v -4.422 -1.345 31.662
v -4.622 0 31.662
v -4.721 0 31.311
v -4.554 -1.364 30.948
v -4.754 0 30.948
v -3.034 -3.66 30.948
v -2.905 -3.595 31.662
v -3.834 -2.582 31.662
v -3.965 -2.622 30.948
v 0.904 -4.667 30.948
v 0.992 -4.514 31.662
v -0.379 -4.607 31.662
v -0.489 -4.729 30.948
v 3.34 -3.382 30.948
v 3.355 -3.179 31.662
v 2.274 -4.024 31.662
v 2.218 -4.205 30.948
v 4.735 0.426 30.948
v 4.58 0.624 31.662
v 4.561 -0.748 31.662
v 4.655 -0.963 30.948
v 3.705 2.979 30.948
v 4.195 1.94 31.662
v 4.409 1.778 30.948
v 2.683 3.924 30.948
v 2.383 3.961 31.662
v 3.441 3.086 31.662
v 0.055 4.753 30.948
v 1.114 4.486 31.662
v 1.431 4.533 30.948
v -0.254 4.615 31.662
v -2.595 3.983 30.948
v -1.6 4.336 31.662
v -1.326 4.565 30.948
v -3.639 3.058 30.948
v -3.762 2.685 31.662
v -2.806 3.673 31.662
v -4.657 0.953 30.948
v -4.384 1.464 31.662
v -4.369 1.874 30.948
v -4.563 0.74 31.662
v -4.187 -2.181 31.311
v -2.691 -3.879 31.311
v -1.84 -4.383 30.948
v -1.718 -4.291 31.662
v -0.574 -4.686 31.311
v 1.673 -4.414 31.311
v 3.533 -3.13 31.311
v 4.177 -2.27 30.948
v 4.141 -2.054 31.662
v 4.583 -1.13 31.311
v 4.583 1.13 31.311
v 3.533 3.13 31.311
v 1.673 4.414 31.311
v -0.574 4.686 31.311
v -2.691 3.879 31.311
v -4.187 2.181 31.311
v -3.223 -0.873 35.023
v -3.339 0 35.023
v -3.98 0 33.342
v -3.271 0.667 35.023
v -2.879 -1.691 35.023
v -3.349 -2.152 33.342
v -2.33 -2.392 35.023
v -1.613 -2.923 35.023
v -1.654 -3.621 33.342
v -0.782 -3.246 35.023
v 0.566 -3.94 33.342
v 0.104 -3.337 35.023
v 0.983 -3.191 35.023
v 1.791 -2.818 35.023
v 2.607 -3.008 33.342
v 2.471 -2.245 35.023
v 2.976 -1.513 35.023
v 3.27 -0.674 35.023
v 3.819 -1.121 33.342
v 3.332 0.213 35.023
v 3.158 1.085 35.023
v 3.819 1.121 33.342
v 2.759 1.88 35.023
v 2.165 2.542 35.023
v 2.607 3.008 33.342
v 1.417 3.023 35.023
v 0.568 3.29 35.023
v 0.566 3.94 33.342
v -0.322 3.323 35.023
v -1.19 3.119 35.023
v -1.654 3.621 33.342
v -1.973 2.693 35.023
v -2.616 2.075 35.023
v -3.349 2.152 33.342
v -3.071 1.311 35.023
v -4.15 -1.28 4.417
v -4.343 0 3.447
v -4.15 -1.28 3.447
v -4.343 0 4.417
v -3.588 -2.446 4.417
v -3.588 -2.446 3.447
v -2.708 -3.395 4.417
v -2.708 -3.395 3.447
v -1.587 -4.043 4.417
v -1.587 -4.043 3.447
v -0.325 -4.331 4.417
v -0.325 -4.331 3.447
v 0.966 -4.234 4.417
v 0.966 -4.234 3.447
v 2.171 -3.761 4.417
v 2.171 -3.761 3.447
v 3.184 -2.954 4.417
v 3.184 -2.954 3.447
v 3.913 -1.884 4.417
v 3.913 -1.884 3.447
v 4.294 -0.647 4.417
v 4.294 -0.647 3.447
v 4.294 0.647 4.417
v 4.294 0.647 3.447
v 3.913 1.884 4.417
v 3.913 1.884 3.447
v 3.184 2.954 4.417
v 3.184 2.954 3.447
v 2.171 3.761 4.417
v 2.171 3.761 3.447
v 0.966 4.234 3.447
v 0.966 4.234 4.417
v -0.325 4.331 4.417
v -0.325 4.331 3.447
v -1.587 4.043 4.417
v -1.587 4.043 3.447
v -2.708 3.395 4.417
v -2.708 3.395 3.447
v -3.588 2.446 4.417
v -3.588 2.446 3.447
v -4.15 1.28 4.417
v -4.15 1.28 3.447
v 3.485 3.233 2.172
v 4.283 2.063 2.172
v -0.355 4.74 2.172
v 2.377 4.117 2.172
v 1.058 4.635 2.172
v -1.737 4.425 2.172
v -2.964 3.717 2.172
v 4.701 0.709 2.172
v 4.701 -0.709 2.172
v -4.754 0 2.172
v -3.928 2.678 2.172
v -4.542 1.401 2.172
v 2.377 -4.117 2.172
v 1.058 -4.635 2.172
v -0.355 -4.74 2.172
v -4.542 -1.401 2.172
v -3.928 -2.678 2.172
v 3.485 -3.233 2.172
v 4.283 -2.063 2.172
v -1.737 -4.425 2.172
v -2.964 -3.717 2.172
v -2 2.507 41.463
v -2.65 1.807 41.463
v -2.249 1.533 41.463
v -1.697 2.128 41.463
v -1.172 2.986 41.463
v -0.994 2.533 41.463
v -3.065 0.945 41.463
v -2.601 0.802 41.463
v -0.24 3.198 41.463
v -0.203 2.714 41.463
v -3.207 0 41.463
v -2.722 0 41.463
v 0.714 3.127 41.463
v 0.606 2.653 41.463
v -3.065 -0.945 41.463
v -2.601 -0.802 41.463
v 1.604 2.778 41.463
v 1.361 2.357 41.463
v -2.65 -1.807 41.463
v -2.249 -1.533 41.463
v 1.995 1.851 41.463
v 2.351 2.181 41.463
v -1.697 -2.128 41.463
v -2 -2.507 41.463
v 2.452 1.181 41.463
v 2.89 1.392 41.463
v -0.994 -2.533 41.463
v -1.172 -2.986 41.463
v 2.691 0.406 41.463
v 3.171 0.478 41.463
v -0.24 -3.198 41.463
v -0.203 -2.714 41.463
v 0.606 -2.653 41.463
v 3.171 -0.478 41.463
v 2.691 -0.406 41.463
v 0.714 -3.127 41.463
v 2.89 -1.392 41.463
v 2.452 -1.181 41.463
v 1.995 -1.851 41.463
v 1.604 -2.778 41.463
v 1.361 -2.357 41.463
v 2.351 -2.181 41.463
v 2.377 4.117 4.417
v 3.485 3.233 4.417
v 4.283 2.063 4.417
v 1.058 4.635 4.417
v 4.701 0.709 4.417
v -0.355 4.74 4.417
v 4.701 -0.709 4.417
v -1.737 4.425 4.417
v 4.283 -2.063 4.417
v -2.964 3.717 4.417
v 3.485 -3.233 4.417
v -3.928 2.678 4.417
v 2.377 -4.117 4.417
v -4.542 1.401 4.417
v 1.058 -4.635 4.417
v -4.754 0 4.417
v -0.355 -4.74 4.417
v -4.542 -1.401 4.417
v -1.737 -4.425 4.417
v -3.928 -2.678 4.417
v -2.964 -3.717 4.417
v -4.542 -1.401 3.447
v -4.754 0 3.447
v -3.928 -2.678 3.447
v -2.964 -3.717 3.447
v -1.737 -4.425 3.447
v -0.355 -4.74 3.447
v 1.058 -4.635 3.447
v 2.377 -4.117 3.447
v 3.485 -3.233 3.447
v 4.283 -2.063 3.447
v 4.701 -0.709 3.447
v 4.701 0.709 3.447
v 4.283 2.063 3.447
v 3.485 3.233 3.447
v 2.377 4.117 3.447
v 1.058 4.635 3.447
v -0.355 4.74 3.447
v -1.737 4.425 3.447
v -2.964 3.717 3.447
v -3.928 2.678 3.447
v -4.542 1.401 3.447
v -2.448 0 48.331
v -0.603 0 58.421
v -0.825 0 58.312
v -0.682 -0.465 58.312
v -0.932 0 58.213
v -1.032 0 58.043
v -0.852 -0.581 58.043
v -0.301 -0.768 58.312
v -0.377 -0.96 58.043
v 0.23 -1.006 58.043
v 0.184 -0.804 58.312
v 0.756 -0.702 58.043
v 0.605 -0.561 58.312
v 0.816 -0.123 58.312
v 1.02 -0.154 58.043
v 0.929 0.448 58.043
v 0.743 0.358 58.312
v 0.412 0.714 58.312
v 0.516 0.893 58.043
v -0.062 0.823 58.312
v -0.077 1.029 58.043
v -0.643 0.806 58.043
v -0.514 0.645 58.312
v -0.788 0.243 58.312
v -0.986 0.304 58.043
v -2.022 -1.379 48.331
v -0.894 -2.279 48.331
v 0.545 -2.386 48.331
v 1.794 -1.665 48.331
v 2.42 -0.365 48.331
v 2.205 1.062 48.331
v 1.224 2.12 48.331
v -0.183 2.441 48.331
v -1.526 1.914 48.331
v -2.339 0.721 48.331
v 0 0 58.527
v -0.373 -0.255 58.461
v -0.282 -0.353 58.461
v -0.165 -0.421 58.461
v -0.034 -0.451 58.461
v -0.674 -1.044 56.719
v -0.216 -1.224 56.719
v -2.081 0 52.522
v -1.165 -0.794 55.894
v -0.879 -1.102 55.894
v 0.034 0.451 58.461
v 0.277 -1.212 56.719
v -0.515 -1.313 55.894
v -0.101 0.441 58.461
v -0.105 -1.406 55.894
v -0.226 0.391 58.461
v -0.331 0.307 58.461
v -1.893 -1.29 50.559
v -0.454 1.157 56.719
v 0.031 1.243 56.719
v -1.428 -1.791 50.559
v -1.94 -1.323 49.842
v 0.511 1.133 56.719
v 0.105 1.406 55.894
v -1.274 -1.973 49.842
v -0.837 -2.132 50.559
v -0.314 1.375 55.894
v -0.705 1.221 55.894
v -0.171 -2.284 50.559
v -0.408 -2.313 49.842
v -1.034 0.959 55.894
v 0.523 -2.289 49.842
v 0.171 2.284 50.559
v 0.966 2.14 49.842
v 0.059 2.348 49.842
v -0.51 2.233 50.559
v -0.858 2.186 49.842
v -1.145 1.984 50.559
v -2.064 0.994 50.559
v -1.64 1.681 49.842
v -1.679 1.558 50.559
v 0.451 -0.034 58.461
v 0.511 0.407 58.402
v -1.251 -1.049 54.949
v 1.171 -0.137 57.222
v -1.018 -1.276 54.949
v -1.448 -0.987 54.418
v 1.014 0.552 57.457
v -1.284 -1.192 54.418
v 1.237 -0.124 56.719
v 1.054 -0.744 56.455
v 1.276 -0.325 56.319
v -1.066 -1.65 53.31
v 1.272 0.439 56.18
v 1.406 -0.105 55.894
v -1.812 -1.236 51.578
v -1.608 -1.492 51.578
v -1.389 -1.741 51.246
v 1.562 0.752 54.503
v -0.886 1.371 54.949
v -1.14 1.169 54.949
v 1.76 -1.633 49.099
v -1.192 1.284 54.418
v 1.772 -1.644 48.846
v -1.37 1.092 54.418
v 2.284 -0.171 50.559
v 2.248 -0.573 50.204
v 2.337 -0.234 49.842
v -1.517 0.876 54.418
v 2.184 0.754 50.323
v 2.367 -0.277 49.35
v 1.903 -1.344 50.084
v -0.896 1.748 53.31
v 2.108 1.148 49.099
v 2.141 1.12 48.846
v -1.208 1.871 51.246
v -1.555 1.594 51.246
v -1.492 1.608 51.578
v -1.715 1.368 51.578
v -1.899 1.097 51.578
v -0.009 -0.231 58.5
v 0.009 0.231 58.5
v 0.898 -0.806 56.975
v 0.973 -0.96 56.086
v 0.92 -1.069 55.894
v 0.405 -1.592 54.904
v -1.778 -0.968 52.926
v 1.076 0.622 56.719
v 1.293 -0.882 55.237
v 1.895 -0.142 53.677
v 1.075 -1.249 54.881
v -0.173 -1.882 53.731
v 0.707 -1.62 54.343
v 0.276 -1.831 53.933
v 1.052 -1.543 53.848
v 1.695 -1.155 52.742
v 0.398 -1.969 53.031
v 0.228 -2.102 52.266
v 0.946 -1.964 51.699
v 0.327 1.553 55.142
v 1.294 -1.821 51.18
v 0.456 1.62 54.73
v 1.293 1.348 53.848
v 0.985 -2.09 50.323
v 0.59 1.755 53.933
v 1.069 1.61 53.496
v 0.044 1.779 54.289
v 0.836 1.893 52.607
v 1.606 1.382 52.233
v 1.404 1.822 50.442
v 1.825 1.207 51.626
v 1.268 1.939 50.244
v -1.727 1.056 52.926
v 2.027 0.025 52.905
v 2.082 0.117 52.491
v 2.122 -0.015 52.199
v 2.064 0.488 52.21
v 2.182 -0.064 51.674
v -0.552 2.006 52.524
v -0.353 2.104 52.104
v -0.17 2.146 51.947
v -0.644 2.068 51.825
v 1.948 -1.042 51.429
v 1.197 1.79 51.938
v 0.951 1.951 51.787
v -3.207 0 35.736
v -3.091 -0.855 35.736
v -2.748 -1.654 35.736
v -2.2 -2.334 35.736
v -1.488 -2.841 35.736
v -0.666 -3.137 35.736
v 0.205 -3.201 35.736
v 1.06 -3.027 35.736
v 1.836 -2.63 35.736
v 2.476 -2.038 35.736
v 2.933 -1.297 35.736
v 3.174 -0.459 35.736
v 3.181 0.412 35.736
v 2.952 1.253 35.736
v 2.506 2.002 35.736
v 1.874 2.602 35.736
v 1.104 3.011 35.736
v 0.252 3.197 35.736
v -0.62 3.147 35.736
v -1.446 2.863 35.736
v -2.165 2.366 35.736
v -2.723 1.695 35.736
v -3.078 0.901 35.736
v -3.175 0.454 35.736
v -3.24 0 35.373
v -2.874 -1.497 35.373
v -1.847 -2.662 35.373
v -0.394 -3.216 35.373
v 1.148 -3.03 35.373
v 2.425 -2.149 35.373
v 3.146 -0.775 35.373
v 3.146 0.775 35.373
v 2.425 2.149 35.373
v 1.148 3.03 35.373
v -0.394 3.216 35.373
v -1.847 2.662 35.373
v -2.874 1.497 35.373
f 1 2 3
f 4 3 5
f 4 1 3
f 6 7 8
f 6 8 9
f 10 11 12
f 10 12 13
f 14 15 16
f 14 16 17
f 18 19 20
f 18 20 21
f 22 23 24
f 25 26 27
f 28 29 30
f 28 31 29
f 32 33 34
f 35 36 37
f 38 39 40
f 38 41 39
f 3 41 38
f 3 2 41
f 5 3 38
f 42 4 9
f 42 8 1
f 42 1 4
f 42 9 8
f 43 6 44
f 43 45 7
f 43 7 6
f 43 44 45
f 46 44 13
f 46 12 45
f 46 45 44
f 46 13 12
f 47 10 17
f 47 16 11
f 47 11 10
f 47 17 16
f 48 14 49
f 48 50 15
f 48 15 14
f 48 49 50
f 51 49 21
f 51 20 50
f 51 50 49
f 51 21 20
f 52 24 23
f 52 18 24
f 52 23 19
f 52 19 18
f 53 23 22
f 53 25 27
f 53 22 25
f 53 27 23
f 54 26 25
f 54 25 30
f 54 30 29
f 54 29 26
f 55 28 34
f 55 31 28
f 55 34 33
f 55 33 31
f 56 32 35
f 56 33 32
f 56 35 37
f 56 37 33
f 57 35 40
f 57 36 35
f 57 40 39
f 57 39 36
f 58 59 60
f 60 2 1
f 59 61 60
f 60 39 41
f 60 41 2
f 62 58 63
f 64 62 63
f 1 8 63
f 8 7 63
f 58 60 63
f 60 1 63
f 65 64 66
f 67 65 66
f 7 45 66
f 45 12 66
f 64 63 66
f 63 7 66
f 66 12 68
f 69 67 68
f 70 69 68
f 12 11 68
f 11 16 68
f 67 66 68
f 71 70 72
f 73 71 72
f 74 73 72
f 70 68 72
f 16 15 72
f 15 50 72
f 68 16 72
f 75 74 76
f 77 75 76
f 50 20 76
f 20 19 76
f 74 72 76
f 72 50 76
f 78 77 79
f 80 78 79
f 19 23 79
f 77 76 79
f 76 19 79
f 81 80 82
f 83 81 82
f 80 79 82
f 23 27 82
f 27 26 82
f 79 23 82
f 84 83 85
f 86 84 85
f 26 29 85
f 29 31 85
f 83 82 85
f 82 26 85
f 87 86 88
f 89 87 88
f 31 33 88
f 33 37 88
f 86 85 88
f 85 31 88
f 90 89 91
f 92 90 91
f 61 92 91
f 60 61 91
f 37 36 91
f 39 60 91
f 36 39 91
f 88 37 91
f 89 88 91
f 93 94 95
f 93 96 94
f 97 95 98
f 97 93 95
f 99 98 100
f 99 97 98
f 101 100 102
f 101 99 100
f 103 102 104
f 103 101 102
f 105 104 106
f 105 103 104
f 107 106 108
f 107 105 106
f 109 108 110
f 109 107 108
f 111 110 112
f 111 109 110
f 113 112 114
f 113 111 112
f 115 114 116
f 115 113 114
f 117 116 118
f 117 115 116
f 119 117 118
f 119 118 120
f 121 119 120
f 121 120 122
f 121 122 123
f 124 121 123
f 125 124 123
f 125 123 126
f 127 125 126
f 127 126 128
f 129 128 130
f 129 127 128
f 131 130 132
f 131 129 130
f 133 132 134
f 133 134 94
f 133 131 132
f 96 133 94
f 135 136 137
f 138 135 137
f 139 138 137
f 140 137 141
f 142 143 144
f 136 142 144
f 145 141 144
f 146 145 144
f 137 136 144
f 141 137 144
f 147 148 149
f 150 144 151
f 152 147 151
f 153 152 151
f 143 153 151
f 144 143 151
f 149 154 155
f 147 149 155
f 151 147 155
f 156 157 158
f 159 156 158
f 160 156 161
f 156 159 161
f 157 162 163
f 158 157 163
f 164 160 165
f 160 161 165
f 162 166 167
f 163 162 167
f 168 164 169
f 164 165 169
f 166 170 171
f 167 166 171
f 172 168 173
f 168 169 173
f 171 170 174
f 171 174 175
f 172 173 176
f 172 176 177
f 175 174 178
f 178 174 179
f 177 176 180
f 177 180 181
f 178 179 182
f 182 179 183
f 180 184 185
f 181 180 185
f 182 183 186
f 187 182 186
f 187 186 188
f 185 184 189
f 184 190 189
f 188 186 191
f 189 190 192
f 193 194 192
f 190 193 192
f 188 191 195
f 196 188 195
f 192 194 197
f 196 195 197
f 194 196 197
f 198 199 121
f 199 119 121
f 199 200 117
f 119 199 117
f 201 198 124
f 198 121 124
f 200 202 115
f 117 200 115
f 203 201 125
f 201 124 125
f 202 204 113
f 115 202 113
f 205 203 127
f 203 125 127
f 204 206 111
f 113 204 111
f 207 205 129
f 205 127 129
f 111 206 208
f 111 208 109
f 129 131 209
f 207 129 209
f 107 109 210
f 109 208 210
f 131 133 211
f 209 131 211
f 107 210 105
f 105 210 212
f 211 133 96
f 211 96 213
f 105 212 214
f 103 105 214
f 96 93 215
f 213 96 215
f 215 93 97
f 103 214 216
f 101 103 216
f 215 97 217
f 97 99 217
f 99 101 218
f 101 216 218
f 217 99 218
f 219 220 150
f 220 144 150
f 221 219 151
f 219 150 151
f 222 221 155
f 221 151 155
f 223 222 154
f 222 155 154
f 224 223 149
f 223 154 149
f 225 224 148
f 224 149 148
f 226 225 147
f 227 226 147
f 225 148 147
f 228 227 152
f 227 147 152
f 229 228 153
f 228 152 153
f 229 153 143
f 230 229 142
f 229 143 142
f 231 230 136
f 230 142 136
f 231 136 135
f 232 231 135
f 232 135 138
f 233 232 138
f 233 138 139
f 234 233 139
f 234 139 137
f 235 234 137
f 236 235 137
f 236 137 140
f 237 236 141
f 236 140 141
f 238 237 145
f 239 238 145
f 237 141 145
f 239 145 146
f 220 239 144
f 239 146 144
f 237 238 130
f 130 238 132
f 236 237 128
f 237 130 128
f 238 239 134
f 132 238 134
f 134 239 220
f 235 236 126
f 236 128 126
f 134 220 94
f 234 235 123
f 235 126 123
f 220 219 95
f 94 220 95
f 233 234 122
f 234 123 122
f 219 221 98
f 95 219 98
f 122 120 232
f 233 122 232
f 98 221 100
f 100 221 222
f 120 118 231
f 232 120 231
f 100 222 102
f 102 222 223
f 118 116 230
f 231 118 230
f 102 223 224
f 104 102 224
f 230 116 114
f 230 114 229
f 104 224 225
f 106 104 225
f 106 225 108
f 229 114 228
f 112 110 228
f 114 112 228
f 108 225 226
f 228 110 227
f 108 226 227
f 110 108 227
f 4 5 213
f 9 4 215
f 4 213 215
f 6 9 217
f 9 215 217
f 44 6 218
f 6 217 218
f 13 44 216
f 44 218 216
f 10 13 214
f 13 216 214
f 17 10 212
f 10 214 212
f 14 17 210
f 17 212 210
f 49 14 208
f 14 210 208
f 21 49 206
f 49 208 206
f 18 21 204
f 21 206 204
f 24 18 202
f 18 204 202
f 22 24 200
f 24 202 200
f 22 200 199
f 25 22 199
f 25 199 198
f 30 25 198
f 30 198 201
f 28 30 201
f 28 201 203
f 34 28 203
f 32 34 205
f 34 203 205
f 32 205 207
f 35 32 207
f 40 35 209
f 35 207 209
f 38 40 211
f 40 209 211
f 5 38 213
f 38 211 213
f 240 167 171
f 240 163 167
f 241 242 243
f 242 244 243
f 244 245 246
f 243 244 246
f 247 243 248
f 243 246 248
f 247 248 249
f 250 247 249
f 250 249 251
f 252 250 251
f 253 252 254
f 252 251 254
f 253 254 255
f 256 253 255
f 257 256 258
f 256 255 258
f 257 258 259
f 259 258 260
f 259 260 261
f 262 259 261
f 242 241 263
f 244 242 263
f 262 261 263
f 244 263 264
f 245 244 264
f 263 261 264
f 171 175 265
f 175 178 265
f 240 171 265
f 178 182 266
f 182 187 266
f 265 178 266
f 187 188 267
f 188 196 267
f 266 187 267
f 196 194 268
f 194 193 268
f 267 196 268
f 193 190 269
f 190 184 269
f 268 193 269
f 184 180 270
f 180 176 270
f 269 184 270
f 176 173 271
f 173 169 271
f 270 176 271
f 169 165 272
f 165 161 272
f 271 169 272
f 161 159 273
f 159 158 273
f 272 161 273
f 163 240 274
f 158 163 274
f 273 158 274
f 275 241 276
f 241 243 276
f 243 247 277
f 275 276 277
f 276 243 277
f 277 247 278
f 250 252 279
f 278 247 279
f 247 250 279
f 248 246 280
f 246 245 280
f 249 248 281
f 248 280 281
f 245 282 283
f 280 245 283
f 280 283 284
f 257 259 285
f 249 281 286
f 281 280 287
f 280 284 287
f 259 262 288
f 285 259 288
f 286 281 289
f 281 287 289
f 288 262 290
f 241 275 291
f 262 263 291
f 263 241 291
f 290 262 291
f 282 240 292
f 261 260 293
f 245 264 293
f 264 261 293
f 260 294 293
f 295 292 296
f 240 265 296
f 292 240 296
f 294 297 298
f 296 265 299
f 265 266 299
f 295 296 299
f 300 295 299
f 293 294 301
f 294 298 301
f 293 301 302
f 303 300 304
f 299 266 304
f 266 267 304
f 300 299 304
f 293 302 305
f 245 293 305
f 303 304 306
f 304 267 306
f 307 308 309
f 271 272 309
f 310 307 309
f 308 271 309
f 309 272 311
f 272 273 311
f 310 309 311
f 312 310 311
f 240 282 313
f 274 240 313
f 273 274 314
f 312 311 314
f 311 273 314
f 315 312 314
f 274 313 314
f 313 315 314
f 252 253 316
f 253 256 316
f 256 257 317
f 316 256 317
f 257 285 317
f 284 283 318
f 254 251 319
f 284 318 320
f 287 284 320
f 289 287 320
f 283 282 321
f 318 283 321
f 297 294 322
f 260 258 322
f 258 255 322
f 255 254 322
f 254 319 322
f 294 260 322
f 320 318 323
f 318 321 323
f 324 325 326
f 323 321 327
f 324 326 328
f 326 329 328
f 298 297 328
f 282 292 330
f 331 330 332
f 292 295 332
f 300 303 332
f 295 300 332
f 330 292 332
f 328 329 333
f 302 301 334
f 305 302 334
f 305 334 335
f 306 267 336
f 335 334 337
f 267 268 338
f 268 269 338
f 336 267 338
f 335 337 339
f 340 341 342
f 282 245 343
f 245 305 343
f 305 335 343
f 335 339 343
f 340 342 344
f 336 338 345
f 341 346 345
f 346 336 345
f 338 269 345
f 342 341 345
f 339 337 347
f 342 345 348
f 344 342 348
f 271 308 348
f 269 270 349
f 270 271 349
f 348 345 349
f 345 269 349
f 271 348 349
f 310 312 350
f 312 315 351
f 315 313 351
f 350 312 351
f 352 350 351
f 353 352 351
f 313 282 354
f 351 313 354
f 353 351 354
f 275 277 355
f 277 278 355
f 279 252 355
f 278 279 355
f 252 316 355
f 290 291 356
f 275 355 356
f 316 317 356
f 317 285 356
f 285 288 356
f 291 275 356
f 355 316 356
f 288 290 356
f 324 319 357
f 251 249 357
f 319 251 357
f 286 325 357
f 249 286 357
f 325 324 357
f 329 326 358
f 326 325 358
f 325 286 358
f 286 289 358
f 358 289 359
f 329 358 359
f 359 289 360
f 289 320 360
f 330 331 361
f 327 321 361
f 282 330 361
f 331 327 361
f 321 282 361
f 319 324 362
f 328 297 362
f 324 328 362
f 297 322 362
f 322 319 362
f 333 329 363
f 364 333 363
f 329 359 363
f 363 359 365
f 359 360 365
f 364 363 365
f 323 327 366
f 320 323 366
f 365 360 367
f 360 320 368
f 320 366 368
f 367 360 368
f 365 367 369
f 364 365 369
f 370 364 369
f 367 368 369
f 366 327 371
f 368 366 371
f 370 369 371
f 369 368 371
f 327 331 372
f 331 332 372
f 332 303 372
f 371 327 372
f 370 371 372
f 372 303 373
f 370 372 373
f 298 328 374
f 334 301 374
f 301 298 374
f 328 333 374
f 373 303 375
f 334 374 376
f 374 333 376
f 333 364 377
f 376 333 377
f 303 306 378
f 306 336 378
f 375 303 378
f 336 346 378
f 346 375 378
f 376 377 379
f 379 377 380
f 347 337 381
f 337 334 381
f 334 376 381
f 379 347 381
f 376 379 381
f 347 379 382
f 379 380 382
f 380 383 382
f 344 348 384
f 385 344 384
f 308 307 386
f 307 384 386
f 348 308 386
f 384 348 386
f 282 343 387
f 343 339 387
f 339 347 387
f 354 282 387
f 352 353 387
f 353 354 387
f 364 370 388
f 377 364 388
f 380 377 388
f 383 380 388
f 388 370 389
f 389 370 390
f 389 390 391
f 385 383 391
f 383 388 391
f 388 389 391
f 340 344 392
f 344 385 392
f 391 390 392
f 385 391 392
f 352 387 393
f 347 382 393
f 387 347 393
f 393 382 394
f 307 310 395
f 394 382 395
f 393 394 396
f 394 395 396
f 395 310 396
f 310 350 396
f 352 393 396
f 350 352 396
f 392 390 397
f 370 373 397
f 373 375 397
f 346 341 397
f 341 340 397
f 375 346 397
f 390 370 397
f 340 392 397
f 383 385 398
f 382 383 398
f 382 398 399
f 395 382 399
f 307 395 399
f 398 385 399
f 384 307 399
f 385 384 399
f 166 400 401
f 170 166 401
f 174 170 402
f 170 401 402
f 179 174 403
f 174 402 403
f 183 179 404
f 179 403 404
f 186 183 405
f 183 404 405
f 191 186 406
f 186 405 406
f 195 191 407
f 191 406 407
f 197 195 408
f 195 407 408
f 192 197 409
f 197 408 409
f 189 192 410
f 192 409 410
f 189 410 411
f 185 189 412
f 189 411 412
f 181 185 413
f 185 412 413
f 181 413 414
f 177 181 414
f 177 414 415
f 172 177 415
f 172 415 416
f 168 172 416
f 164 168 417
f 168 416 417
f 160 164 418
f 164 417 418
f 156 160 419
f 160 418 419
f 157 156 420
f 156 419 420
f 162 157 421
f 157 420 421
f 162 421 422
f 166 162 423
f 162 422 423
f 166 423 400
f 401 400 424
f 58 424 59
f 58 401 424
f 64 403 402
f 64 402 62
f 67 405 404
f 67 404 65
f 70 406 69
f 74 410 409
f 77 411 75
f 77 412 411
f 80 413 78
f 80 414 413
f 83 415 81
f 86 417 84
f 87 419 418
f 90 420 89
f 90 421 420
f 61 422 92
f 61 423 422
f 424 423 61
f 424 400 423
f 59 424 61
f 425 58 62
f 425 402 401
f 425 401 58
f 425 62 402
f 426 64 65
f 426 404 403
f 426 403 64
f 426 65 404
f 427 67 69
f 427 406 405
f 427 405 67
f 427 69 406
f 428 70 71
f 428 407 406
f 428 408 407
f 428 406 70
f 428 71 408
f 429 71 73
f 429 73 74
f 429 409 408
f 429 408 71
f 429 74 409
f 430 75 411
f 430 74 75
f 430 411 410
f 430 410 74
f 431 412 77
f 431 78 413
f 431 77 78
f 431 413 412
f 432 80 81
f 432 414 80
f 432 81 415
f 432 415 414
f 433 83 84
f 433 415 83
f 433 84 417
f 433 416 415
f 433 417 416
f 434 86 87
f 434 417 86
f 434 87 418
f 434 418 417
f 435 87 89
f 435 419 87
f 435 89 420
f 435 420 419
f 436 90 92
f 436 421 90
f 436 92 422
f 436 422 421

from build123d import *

# Parameters (mm, degrees)
F0_W = 4.3428323324
F0_H = 0.9698241177
F2_R = 2


with BuildPart() as f1:
    # F0 (on Front) → F1 (revolve)
    with BuildSketch(Plane.XZ):
        Polygon((0, 41.463367641), (-2.7215683367, 41.463367641), (-3.2072065232, 41.463367641), (-3.2072065232, 35.3673755124), (-4.7536900101, 31.317062021), (-4.7536900101, 4.4173045305), (-4.3428323324, 4.4173045305), (0, 4.4173045305), align=None)
        with Locations((-2.1714161662, 3.9323924717)):
            Rectangle(F0_W, F0_H)
        Polygon((0, 2.1724704409), (0, 3.4474804128), (-4.3428323324, 3.4474804128), (-4.7536900101, 3.4474804128), (-4.7536900101, 2.1724704409), align=None)
    revolve(axis=Axis((0, 0, 29.95), (0, 0, 1)))

    # F2
    f2_edges = [f1.edges().sort_by_distance(p)[0] for p in [
        (3.207207, 0, 35.367376),
        (4.75369, 0, 31.317062),
    ]]
    fillet(f2_edges, radius=F2_R)

    # F0 (on Front) → F3 (revolve)
    with BuildSketch(Plane.XZ):
        with BuildLine():
            Line((0, 41.463367641), (0, 58.5273988545))
            add(Edge.make_bspline(
                [(0, 58.5273988545), (-0.36253144, 58.486839259), (-1.1596346327, 58.3977811986), (-1.1249576474, 56.6070187801), (-2.3576224657, 52.9317939751), (-2.579834999, 45.9332704529), (-2.7215683367, 41.463367641)],
                knots=[0, 0, 0, 0, 0.1308182588, 0.2872358796, 0.5423006179, 1, 1, 1, 1], degree=3))
            Line((-2.7215683367, 41.463367641), (0, 41.463367641))
        make_face()
    revolve(axis=Axis((0, 0, 29.95), (0, 0, 1)))


solid = f1.part
